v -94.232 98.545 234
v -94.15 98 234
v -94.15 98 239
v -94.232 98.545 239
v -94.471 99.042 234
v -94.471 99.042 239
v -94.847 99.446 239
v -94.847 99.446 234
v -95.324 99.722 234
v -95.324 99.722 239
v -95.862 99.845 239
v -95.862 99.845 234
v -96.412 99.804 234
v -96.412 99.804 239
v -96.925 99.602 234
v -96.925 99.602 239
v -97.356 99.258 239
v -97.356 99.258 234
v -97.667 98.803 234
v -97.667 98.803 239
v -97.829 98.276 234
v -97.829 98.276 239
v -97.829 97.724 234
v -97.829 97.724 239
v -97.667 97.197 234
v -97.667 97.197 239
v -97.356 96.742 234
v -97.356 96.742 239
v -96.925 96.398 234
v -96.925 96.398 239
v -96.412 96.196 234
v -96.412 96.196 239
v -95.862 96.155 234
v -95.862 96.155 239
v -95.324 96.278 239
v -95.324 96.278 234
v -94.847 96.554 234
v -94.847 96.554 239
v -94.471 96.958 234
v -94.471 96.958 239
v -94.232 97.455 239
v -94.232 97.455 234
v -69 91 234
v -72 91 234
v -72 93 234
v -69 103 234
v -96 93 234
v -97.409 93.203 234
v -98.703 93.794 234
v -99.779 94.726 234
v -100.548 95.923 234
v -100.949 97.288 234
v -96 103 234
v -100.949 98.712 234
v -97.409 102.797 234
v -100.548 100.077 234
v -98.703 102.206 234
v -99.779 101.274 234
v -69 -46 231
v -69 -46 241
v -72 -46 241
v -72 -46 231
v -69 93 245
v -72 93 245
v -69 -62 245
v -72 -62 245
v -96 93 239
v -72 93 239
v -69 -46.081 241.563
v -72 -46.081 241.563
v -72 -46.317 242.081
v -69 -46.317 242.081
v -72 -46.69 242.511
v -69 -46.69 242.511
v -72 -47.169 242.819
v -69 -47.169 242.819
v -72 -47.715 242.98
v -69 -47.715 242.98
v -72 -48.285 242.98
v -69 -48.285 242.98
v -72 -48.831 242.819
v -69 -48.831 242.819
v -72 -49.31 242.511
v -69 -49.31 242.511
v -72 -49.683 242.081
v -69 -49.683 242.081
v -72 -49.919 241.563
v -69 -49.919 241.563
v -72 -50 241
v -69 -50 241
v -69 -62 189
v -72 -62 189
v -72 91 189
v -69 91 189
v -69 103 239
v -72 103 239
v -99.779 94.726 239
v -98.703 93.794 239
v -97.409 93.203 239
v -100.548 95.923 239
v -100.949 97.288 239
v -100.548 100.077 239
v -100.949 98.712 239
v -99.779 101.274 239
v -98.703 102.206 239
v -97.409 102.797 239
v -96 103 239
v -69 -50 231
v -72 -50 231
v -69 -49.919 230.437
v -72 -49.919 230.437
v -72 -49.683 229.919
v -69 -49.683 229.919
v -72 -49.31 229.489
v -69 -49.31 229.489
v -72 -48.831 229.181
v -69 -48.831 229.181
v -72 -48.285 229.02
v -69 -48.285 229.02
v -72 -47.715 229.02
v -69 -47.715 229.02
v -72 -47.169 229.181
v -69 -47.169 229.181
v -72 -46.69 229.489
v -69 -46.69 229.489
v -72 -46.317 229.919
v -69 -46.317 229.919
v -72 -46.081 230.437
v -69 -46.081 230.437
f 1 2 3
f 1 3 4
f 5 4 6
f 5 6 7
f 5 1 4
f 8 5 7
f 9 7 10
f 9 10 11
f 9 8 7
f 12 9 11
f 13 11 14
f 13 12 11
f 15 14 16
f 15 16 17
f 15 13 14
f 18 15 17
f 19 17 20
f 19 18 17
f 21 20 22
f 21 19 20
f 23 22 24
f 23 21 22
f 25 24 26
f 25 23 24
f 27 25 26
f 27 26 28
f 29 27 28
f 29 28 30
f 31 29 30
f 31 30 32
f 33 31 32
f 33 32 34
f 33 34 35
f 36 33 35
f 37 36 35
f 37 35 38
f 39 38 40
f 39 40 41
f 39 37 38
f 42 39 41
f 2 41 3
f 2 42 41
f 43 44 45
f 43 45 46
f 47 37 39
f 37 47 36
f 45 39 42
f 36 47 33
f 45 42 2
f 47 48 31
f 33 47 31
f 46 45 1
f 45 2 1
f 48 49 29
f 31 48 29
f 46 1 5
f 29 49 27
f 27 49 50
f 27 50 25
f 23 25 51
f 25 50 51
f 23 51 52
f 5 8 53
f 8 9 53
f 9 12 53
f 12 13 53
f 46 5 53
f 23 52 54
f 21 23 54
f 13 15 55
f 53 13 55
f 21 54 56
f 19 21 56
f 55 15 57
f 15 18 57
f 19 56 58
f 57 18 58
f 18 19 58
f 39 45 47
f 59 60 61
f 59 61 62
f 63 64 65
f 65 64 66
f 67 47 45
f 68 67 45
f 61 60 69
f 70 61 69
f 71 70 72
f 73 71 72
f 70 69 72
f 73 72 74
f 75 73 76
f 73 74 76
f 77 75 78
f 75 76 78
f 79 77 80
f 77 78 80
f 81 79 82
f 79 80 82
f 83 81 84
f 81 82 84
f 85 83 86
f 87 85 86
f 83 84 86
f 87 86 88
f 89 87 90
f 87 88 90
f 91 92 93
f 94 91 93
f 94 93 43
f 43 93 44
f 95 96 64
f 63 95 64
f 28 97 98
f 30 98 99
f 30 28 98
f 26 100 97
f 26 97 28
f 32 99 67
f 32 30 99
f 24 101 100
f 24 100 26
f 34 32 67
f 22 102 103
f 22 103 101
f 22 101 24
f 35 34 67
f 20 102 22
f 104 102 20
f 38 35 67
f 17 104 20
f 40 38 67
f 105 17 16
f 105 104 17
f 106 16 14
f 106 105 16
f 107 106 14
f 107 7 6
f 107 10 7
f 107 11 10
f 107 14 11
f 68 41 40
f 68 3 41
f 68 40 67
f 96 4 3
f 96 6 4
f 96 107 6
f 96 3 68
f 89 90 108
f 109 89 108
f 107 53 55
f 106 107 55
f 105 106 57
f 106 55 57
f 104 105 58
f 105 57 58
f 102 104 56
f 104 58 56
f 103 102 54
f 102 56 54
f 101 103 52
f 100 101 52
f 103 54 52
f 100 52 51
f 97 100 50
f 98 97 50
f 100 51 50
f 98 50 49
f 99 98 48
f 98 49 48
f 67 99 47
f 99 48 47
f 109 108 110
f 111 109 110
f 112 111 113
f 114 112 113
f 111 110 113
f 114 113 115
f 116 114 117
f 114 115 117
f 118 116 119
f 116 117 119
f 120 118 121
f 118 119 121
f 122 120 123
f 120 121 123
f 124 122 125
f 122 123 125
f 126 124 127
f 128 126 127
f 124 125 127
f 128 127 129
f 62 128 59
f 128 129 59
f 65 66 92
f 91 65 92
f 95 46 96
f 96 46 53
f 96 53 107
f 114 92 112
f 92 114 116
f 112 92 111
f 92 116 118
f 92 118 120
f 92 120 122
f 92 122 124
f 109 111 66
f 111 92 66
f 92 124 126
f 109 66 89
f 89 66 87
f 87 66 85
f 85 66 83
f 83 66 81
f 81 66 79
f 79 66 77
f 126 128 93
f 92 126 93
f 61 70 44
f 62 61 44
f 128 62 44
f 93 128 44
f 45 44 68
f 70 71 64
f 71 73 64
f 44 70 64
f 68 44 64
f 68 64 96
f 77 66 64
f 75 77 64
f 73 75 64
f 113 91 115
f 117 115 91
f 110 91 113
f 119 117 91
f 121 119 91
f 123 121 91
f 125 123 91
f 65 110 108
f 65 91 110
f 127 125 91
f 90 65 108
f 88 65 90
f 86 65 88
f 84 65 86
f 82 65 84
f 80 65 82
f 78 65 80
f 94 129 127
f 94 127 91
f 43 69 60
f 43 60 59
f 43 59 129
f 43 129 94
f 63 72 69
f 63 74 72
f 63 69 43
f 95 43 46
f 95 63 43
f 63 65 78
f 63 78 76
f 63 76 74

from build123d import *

# Parameters (mm, degrees)
SKETCH246_R     = 1.85
PAD021_DEPTH    = 5
PAD022_DEPTH    = 3
POCKET017_DEPTH = 5


with BuildPart() as part:
    # Sketch246 → Pad021 (new body)
    with BuildSketch(Plane.XY):
        with BuildLine():
            ThreePointArc((0, 5), (-5, 0), (0, -5))
            Line((0, -5), (24, -5))
            Line((24, -5), (24, 5))
            Line((0, 5), (24, 5))
        make_face()
        Circle(SKETCH246_R, mode=Mode.SUBTRACT)
    extrude(amount=PAD021_DEPTH)

    # Sketch247 (on Face3 of Pad021) → Pad022 (join)
    with BuildSketch(Plane.YZ.offset(24)):
        Polygon((-7, 0), (5, 0), (5, 5), (-5, 11), (-160, 11), (-160, -45), (-7, -45), align=None)
    extrude(amount=PAD022_DEPTH)

    # Sketch248 (on Face11 of Pad022) → Pocket017 (cut)
    with BuildSketch(Plane.YZ.offset(27)):
        with BuildLine():
            ThreePointArc((-144, 7), (-146, 9), (-148, 7))
            Line((-148, 7), (-148, -3))
            ThreePointArc((-148, -3), (-146, -5), (-144, -3))
            Line((-144, 7), (-144, -3))
        make_face()
    extrude(amount=-POCKET017_DEPTH, mode=Mode.SUBTRACT)


with BuildPart() as part_1:
    # Body011 placement: moved
    add(part.part.moved(Location((-96, 98, 234))))


solid = part_1.part
